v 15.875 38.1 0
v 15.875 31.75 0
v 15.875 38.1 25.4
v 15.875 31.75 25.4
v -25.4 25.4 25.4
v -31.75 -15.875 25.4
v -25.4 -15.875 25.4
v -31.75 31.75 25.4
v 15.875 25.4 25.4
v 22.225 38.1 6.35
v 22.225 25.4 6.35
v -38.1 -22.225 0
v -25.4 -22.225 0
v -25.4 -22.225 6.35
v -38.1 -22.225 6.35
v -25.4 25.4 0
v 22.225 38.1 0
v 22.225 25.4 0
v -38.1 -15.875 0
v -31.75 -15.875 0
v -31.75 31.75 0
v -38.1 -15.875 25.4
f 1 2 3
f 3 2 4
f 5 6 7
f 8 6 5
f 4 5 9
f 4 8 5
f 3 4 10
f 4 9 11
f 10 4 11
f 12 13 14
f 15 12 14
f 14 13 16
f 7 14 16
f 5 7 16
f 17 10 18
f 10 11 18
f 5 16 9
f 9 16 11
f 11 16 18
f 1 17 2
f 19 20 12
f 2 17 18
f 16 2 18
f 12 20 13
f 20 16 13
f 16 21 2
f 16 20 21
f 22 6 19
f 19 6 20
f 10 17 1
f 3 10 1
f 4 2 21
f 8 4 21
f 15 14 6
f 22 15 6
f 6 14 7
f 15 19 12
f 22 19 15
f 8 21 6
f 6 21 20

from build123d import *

# Parameters (mm, degrees)
F1_DEPTH = 25.4
F2_SIZE2 = 19.05
F2_SIZE  = 6.35
F5_DEPTH = 6.35
F6_DEPTH = 6.35


with BuildPart() as f1:
    # F0 (on Top) → F1 (new body)
    with BuildSketch(Plane.XY):
        Polygon((-31.75, -22.225), (-25.4, -22.225), (-25.4, 25.4), (22.225, 25.4), (22.225, 31.75), (-31.75, 31.75), align=None)
    extrude(amount=F1_DEPTH)

    # F2
    f2_edges = [f1.edges().sort_by_distance(p)[0] for p in [
        (-28.575, -22.225, 25.4),
        (22.225, 28.575, 25.4),
    ]]
    f2_side = f1.faces().sort_by_distance((-28.575, -21.461678, 25.4))[0]
    chamfer(f2_edges, length=F2_SIZE, length2=F2_SIZE2, reference=f2_side)

    # F4 (on face) → F5 (join)
    with BuildSketch(Plane(origin=(0, 31.75, 0), x_dir=(-1, 0, 0), z_dir=(0, 1, 0))):
        Polygon((-15.875, 0), (-15.875, 25.4), (-22.225, 6.35), (-22.225, 0), align=None)
    extrude(amount=F5_DEPTH)

    # F3 (on face) → F6 (join)
    with BuildSketch(Plane(origin=(-31.75, 0, 0), x_dir=(0, -1, 0), z_dir=(-1, 0, 0))):
        Polygon((22.225, 6.35), (15.875, 25.4), (15.875, 0), (22.225, 0), align=None)
    extrude(amount=F6_DEPTH)


solid = f1.part
